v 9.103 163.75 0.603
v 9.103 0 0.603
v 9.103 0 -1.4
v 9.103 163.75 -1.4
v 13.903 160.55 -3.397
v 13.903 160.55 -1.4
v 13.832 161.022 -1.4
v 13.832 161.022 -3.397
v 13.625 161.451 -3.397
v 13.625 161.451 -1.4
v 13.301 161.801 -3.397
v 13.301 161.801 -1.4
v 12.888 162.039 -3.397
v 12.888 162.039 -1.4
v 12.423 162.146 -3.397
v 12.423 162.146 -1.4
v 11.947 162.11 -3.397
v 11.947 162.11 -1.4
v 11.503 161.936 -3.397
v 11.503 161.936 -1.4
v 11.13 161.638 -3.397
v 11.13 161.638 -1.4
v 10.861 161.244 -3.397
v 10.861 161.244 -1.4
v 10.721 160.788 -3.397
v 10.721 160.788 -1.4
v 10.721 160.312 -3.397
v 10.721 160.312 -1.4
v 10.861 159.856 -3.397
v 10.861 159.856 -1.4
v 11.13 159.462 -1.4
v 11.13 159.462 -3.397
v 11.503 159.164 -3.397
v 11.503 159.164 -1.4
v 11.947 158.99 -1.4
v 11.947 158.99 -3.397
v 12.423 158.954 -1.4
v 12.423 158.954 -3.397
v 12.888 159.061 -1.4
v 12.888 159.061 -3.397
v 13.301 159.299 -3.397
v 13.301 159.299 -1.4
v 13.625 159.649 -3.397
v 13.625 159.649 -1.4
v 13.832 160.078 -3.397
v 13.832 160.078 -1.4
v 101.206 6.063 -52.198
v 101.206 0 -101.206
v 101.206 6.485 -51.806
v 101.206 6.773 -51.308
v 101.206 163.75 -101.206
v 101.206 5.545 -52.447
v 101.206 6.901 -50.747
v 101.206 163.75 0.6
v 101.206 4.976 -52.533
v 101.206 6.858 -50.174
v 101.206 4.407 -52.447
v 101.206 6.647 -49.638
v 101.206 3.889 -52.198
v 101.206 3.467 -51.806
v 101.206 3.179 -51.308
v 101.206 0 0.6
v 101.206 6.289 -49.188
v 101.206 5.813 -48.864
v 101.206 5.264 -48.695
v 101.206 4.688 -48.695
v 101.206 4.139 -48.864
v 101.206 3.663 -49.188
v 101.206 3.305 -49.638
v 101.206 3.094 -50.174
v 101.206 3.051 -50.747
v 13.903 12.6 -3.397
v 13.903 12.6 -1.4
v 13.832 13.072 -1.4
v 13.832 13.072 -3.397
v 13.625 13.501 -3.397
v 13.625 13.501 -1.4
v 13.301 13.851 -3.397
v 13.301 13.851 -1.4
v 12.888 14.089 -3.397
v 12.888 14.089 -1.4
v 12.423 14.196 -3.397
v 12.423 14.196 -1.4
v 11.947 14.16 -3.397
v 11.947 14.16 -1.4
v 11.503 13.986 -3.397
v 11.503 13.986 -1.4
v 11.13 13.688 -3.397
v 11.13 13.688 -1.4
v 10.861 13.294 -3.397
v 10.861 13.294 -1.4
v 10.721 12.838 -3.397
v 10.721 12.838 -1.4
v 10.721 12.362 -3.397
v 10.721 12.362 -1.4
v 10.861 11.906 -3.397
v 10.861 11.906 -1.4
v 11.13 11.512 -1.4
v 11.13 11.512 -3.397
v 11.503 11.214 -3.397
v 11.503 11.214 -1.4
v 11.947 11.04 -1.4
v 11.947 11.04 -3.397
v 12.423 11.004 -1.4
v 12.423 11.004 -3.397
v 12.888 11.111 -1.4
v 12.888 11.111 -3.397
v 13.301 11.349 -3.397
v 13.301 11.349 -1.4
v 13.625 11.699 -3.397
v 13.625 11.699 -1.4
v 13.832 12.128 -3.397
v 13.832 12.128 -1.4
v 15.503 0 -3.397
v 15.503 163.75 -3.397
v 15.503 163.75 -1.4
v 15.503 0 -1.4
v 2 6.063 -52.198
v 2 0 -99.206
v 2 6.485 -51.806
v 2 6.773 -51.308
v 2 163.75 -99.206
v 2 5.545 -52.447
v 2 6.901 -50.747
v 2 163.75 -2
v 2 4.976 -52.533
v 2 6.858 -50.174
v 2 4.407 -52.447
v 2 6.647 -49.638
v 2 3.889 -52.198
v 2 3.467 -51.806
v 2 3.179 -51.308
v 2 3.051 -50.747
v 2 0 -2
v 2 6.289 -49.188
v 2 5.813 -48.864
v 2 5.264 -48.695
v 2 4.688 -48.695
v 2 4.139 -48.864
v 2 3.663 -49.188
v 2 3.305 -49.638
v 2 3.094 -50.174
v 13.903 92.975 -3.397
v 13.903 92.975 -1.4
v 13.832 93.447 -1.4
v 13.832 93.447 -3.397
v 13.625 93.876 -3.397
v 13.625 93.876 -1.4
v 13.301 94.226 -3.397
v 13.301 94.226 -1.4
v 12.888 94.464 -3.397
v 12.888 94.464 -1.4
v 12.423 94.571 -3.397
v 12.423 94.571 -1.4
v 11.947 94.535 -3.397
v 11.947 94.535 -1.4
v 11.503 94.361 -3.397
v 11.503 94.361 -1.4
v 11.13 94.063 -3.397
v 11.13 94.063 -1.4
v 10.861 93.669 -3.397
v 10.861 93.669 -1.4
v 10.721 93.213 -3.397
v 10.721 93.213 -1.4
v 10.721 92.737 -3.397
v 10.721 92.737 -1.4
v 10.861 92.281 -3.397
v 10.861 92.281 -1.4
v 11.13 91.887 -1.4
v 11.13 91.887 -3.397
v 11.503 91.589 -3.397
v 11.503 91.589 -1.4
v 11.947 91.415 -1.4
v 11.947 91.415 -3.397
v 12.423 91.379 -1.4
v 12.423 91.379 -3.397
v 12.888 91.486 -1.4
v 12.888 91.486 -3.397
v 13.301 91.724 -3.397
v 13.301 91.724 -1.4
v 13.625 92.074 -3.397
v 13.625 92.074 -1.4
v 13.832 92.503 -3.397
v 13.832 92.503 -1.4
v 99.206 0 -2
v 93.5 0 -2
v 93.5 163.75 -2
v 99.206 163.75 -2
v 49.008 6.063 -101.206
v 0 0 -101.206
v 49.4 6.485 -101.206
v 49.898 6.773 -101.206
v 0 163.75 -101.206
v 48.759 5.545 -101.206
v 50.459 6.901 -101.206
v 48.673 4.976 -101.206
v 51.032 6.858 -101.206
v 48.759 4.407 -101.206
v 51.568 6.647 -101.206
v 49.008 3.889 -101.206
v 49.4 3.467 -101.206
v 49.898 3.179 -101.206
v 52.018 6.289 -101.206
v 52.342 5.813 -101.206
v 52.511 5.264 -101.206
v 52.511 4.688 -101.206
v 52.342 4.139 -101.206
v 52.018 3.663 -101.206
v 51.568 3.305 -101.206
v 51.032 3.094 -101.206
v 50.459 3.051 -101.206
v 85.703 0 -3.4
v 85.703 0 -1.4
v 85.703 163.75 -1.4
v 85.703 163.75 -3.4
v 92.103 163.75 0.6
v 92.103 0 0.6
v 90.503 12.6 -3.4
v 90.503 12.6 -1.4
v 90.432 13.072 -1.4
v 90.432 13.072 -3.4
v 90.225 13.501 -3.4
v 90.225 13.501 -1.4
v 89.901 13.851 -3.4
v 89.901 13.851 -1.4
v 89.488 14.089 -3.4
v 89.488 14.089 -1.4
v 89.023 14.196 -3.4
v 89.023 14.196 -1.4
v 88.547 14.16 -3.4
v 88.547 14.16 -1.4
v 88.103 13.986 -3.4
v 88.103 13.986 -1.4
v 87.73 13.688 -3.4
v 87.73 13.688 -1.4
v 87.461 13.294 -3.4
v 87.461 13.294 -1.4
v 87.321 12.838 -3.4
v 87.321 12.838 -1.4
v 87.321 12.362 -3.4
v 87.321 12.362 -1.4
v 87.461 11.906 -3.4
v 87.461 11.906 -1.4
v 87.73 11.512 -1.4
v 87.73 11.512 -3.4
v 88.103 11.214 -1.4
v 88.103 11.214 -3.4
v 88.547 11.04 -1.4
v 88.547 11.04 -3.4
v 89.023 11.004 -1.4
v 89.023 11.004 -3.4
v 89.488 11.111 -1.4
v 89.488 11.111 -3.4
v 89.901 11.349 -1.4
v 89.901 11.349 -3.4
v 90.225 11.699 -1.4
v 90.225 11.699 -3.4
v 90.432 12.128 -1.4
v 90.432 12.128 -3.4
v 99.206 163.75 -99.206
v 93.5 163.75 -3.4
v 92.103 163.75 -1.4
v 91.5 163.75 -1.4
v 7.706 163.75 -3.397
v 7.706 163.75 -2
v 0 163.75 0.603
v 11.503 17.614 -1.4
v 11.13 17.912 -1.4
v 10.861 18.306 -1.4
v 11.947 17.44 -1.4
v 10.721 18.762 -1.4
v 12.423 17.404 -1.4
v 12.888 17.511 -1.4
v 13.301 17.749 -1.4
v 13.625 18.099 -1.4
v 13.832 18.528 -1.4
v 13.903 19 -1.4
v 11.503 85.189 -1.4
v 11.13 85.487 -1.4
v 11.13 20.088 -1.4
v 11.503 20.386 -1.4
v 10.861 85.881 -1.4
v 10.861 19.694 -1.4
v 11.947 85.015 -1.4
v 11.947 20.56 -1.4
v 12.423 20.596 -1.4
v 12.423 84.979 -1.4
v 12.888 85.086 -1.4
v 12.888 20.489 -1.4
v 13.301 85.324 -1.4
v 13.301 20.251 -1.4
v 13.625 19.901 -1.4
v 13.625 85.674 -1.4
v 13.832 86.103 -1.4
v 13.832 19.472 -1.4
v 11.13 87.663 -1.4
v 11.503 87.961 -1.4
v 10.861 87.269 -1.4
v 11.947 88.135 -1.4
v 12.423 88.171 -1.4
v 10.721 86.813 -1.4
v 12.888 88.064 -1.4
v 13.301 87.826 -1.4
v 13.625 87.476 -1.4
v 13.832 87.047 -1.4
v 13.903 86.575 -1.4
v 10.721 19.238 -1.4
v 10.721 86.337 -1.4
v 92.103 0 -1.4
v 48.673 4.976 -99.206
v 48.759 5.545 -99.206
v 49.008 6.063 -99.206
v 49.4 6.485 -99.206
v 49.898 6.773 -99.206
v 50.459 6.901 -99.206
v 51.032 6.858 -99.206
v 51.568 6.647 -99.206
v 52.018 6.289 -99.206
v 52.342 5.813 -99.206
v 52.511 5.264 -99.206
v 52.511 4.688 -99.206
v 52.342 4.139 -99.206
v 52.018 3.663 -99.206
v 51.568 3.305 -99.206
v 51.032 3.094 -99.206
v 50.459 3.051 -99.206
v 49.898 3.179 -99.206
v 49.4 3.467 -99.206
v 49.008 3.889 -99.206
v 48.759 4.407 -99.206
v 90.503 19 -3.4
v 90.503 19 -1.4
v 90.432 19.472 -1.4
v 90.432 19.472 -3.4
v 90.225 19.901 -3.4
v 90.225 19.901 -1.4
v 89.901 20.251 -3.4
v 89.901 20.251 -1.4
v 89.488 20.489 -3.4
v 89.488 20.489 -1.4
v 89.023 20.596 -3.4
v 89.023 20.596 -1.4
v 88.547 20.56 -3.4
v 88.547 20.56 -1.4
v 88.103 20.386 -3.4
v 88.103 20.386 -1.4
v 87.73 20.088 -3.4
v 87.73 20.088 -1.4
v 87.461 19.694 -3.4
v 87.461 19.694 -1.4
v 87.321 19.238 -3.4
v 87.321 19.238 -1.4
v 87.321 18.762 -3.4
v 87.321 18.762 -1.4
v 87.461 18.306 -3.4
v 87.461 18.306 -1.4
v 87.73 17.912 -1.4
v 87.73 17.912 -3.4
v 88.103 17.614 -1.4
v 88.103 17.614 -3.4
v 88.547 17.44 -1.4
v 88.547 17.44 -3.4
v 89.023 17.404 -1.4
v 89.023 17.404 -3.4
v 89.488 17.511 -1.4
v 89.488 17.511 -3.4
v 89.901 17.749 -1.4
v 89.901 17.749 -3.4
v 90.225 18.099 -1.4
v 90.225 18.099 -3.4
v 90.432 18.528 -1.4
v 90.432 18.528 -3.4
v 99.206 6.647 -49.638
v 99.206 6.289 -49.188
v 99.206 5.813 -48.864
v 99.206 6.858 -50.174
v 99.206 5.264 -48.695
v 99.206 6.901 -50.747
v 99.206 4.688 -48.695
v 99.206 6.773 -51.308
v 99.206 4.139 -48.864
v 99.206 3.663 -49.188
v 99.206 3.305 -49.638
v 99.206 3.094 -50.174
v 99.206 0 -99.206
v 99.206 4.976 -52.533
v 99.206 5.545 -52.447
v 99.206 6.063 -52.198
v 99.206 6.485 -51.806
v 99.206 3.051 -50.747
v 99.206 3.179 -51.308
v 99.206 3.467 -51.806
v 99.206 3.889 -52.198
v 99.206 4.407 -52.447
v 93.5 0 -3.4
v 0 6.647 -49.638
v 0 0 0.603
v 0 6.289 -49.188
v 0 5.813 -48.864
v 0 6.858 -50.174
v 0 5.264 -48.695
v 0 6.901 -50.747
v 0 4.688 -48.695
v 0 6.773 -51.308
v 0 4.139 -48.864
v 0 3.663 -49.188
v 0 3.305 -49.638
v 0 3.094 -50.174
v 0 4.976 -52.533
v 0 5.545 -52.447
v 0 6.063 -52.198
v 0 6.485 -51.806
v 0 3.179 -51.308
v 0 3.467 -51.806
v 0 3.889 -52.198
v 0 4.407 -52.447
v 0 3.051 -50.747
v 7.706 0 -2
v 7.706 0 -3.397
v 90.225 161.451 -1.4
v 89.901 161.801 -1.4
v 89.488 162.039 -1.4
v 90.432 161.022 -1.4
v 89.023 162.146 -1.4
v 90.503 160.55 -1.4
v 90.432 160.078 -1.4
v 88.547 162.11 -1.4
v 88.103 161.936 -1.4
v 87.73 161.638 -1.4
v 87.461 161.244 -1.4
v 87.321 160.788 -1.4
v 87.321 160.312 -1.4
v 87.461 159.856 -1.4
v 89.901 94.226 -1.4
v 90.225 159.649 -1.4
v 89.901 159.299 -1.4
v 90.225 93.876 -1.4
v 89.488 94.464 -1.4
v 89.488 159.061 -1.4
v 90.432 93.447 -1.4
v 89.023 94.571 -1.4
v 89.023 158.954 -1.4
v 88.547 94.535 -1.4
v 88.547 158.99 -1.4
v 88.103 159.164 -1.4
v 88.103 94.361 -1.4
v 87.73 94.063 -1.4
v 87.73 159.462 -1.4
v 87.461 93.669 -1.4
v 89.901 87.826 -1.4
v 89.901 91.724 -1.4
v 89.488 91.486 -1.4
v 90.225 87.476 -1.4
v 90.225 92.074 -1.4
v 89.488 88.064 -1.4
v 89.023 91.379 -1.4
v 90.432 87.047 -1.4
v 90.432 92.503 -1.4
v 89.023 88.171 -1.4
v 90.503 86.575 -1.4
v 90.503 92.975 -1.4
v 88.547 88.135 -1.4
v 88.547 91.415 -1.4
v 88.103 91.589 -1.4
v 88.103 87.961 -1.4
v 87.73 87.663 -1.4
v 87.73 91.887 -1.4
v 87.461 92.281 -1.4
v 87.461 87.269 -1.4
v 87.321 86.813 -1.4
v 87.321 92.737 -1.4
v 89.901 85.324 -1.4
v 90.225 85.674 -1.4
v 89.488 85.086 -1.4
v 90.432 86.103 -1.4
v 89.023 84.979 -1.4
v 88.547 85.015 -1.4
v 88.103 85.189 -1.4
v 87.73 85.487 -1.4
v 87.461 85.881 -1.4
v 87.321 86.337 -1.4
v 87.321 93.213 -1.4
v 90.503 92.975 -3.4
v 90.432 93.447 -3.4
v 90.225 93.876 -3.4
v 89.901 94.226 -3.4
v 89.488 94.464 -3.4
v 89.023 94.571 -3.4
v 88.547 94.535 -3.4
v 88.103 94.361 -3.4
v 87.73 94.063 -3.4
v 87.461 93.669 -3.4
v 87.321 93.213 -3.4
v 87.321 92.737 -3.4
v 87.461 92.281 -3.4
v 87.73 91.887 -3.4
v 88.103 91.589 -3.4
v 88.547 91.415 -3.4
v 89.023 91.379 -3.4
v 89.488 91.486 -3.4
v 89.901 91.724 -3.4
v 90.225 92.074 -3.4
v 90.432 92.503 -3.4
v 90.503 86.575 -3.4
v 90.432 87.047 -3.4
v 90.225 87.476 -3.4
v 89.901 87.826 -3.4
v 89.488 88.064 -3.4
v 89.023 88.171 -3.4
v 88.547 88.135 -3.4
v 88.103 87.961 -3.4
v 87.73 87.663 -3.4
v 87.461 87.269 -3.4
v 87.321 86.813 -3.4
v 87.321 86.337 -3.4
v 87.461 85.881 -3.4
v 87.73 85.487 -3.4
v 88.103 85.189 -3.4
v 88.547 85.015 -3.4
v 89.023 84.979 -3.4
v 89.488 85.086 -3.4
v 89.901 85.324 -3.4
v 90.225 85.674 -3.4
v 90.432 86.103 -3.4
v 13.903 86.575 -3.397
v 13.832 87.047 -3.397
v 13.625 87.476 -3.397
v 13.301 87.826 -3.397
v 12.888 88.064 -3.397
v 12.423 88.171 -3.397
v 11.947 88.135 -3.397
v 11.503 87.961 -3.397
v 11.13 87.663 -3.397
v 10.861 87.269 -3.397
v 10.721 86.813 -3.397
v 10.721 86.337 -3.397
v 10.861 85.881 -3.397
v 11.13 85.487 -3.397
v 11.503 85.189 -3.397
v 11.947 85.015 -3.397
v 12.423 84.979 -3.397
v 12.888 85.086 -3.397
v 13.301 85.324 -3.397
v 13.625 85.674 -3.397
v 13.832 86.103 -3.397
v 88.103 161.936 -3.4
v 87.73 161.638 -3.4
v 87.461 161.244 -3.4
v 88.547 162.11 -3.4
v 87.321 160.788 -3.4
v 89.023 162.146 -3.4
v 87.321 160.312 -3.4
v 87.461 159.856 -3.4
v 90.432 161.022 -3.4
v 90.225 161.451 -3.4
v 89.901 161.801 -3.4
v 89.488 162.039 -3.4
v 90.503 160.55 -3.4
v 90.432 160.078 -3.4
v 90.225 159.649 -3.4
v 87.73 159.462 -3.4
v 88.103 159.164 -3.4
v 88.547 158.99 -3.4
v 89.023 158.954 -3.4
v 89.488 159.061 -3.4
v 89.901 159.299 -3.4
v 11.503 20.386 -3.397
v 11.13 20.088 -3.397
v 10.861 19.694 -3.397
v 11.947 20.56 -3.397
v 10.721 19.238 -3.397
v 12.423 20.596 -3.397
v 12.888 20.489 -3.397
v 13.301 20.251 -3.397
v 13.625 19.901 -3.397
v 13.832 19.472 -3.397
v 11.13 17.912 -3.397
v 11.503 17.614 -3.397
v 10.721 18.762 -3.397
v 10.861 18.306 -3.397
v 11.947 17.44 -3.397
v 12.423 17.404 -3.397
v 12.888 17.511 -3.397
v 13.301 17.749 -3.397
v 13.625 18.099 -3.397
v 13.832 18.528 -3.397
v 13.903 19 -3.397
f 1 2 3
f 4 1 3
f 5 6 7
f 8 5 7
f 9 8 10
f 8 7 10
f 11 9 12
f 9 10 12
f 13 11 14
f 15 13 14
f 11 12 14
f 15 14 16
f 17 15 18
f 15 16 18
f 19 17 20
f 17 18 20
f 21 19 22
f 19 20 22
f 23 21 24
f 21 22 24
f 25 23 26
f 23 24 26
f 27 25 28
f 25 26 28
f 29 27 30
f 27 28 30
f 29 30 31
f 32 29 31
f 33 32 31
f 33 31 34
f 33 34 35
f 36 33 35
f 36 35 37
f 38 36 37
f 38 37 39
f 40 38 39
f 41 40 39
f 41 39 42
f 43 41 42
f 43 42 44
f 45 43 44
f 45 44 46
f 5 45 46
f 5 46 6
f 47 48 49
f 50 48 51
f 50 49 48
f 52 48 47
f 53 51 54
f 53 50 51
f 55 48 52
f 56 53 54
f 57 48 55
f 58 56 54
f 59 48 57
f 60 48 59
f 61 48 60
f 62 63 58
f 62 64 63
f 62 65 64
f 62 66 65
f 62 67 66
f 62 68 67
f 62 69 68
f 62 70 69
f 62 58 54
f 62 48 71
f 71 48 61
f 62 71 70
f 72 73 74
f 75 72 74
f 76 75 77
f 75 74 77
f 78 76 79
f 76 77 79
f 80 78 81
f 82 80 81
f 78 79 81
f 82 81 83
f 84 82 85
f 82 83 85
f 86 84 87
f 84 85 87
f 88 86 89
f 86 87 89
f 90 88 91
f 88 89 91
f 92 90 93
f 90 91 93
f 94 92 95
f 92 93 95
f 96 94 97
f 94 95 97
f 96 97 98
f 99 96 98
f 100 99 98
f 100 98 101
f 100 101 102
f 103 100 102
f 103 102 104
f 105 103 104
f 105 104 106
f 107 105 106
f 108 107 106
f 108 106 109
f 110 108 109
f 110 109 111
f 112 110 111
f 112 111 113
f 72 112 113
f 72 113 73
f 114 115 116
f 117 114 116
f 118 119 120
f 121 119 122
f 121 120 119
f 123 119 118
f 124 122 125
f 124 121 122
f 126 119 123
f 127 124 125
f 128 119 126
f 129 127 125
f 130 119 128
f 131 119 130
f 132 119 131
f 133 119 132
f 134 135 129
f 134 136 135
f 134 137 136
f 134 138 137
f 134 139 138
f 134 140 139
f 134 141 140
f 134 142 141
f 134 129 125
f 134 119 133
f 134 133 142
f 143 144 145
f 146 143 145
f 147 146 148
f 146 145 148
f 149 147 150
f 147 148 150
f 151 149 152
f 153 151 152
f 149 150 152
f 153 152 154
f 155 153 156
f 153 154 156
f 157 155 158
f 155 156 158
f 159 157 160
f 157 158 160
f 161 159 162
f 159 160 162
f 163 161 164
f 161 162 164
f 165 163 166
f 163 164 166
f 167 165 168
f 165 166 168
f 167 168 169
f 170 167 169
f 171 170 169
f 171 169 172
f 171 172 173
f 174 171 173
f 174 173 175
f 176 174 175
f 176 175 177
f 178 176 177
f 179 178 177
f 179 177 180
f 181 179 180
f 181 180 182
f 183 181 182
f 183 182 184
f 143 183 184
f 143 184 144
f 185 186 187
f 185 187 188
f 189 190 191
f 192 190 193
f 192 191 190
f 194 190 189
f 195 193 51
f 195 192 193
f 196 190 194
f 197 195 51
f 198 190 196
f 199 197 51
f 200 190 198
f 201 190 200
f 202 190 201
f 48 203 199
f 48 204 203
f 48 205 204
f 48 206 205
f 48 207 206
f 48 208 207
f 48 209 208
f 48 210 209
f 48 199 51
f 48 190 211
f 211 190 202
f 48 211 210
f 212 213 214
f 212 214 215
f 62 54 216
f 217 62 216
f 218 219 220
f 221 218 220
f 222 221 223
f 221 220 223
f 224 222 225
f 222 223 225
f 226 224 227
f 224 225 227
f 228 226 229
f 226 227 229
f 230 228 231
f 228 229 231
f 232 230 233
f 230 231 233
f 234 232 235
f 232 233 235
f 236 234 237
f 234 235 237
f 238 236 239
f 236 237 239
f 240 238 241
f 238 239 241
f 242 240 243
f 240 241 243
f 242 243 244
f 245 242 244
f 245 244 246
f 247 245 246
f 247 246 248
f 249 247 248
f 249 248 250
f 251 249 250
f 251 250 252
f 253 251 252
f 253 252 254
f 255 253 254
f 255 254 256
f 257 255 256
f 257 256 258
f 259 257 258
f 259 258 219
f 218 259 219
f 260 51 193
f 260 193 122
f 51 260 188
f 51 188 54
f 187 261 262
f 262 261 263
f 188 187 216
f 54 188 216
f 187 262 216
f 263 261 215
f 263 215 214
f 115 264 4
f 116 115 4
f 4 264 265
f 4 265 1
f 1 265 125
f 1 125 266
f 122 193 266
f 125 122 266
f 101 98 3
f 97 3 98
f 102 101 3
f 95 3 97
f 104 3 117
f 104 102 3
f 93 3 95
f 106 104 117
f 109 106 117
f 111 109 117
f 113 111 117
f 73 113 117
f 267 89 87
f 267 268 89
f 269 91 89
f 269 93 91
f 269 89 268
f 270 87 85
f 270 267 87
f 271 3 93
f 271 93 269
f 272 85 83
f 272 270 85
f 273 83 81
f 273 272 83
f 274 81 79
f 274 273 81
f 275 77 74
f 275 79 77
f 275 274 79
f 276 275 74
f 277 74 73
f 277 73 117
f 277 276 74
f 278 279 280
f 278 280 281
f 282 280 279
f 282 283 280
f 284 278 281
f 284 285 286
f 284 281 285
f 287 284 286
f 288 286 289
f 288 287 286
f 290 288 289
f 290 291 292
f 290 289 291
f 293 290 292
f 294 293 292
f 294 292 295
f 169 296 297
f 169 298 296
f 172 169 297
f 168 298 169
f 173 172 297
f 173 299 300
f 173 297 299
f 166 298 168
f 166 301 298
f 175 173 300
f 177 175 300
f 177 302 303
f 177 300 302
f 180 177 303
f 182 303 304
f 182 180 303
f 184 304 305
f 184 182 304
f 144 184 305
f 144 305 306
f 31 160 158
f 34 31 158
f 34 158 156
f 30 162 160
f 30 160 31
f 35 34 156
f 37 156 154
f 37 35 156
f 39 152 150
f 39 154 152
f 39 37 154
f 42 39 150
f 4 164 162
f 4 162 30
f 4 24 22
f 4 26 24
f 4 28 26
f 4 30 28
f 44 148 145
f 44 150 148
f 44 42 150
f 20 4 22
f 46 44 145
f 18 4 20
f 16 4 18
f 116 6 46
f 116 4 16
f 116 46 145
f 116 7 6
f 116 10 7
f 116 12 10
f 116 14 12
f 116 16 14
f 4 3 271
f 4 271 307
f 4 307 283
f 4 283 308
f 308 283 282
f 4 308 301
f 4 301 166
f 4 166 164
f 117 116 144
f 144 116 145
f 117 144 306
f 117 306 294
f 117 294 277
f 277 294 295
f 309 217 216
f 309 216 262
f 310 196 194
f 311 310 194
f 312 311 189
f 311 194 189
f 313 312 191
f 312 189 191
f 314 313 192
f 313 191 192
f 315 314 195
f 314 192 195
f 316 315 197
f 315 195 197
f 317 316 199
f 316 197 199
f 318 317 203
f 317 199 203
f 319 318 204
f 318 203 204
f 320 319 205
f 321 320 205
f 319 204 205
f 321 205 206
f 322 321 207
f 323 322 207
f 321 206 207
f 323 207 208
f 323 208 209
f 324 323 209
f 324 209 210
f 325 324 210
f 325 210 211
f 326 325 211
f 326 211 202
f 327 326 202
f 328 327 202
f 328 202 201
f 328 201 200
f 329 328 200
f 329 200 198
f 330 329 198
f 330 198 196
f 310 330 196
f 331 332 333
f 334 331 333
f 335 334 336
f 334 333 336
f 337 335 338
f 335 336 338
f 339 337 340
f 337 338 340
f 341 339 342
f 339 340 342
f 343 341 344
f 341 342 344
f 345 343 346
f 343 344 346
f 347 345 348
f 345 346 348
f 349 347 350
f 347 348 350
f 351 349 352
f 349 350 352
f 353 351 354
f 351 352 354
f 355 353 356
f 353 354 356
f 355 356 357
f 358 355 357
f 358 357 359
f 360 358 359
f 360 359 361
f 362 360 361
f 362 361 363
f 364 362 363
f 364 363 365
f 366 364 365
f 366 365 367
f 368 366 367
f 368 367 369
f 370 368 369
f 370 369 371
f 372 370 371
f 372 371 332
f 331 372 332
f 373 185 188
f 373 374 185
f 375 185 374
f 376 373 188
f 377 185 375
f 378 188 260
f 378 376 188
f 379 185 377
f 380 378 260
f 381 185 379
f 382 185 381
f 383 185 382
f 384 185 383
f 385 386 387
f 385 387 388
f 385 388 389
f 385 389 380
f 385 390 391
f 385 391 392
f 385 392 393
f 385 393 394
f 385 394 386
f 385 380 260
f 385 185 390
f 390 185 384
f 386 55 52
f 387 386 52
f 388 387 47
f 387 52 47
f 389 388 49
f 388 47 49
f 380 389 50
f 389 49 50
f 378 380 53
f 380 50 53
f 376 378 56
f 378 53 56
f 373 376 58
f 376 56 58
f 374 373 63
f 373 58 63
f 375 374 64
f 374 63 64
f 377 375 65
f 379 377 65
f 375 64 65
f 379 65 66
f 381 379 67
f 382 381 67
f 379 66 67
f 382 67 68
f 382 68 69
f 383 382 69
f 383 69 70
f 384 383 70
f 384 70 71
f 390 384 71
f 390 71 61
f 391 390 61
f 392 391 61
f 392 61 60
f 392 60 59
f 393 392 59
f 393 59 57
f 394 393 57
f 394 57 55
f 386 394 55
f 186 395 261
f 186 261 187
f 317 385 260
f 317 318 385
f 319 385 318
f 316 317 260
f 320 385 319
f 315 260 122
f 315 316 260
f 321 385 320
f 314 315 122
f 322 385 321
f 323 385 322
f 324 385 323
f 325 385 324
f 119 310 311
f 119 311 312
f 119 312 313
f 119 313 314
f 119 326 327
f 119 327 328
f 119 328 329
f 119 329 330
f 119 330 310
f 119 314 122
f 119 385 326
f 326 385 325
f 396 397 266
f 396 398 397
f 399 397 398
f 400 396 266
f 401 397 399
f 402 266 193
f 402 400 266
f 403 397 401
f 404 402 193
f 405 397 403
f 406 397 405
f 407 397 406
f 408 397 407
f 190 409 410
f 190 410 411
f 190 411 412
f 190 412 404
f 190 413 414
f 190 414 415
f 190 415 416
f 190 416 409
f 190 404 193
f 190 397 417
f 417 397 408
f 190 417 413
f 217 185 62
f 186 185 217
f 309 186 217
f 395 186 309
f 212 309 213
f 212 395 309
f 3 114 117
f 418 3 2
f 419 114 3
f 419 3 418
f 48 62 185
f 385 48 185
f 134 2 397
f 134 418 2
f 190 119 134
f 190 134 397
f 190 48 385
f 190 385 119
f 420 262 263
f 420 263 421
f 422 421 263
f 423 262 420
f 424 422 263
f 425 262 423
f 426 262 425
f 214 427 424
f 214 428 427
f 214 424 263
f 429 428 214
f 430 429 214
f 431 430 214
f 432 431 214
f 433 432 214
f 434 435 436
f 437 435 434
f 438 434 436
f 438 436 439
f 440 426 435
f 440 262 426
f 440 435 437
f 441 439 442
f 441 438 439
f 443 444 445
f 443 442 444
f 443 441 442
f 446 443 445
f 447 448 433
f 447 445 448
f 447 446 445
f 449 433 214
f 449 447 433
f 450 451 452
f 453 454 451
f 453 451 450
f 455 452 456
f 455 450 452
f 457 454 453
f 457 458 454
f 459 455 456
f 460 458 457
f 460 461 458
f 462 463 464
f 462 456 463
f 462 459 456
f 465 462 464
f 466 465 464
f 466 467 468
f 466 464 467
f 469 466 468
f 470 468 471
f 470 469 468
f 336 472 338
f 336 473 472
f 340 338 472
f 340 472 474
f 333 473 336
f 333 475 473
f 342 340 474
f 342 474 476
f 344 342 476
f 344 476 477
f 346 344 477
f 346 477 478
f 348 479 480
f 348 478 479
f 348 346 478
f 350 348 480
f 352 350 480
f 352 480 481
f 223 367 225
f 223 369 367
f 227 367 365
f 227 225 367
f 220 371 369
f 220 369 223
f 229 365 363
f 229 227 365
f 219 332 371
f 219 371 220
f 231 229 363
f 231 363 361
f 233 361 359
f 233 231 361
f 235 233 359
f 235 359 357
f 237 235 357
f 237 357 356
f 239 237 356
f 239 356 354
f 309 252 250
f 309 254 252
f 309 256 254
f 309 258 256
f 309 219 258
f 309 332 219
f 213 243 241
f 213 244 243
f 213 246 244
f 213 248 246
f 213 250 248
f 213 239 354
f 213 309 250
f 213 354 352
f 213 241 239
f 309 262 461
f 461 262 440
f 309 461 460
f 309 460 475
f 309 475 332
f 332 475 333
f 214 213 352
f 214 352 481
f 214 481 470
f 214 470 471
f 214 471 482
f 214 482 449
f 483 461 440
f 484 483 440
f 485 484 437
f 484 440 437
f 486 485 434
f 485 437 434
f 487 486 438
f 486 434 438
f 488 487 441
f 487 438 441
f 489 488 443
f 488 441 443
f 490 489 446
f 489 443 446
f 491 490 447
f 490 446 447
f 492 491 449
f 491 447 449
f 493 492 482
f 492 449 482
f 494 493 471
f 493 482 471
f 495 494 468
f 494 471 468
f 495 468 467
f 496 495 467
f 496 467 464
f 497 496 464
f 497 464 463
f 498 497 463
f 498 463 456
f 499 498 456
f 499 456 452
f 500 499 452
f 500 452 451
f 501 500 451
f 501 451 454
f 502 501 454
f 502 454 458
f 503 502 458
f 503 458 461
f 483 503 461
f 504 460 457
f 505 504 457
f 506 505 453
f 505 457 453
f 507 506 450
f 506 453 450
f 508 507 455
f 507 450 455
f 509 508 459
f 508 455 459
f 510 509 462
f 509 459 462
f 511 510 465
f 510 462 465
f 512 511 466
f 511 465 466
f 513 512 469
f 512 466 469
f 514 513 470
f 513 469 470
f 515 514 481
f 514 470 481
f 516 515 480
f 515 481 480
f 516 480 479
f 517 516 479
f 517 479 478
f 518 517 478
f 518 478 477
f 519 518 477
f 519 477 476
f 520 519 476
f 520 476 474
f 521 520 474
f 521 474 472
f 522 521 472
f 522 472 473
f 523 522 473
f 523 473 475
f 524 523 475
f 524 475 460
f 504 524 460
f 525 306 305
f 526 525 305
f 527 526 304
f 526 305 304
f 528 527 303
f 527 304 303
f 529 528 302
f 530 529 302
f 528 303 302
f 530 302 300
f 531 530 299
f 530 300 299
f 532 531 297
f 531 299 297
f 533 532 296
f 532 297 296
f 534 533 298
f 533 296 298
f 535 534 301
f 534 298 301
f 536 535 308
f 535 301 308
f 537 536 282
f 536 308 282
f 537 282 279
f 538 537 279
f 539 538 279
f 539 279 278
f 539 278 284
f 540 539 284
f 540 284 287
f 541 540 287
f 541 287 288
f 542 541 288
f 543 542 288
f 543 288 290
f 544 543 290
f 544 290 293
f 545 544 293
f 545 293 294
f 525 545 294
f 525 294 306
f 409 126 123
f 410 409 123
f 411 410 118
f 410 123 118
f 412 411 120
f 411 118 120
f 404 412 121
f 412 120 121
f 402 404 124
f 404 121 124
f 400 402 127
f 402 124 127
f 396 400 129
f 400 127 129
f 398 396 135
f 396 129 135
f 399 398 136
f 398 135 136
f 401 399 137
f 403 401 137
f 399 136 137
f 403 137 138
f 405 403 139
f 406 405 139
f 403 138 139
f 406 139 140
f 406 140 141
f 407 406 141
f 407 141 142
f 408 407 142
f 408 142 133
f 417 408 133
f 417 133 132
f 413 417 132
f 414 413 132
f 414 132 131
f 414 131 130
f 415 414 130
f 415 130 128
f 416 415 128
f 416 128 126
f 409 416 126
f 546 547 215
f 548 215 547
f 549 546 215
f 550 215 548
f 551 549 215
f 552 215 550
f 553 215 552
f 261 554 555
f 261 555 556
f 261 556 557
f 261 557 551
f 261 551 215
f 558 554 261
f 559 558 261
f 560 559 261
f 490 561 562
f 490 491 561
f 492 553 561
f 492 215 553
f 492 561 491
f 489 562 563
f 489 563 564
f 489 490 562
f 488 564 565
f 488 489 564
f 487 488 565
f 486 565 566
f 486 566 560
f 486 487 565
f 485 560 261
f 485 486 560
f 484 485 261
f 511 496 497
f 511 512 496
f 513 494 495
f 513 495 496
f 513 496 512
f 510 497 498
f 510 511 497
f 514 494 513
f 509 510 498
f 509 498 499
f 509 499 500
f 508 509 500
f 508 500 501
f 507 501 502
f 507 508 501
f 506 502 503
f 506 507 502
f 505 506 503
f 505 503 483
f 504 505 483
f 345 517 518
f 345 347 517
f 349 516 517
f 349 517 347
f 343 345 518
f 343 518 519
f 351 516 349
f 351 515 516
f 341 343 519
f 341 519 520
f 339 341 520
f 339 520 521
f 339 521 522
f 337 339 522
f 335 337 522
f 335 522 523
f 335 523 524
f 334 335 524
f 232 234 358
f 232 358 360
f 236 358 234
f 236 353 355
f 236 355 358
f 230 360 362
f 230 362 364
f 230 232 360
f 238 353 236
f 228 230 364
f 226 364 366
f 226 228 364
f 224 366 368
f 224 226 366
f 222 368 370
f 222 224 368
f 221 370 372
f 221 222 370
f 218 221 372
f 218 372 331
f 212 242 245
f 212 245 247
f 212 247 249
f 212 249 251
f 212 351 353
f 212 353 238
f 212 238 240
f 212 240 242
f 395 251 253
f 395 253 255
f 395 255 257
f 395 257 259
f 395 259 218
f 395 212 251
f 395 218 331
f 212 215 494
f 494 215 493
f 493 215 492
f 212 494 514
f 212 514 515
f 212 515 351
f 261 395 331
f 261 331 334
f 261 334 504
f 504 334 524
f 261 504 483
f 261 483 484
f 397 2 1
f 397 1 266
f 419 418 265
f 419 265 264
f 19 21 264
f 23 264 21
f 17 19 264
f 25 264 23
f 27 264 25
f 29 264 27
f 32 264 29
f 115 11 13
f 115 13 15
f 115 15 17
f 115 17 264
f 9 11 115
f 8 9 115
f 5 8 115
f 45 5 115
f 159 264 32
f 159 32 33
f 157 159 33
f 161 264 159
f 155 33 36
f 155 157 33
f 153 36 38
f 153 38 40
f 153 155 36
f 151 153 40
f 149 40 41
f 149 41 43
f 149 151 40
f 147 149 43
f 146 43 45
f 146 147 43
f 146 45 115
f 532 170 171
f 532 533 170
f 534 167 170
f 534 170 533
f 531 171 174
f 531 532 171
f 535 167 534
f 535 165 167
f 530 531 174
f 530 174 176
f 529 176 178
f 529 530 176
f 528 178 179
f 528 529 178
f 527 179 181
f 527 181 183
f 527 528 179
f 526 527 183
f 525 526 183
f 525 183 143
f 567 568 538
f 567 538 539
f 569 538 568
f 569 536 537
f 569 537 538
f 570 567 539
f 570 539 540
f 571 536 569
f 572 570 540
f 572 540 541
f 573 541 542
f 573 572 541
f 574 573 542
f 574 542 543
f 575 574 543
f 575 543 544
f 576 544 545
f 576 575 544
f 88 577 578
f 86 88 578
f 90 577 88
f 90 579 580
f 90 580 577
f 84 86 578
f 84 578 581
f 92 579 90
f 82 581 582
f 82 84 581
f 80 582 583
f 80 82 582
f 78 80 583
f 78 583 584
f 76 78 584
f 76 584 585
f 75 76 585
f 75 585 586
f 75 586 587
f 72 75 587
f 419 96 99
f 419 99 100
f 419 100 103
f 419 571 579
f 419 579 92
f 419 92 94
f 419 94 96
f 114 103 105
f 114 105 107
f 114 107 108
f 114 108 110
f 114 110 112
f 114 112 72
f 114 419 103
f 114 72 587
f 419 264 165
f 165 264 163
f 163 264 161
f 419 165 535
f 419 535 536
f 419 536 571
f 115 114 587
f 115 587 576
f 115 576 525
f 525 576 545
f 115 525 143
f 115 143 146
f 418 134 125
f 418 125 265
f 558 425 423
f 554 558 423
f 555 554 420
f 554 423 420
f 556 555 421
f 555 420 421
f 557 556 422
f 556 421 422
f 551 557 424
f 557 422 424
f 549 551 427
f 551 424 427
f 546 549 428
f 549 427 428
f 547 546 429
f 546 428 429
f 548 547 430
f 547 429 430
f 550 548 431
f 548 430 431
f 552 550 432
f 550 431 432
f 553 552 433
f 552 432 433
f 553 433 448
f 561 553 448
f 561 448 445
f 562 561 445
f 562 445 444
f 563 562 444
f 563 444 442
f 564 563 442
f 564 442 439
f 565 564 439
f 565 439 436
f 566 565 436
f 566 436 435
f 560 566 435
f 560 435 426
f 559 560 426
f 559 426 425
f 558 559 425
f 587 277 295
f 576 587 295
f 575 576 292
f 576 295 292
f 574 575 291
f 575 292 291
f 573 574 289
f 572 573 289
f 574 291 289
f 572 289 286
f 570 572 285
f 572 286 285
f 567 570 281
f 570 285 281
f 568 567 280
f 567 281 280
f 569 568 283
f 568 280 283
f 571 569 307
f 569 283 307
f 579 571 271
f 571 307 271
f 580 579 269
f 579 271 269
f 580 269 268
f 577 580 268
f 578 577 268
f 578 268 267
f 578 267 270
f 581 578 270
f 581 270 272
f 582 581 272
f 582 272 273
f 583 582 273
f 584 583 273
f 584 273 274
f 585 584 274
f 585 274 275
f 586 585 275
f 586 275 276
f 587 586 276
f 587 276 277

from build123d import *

# Parameters (mm, degrees)
BOSS_EXTRUDE1_DEPTH = 327.5
SKETCH2_R           = 1.6
CUT_EXTRUDE2_DEPTH  = 10
SKETCH3_R           = 1.93
CUT_EXTRUDE3_DEPTH  = 102
SKETCH4_R           = 1.93
CUT_EXTRUDE4_DEPTH  = 10
SKETCH5_W           = 116.752499477
SKETCH5_H           = 165.661363519
CUT_EXTRUDE5_DEPTH  = 191
SKETCH6_W           = 83
SKETCH6_H           = 2.003
CUT_EXTRUDE6_DEPTH  = 203


with BuildPart() as part:
    # Sketch1 → Boss-Extrude1 (new body)
    with BuildSketch(Plane(origin=(0, 0, 0), x_dir=(1, 0, 0), z_dir=(0, 1, 0))):
        Polygon((0, -0.603), (0, 101.206), (101.206, 101.206), (101.206, -0.6), (91.5, -0.6), (91.5, 1.4), (85.703, 1.4), (85.703, 3.4), (93.5, 3.4), (93.5, 2), (99.206, 2), (99.206, 99.206), (2, 99.206), (2, 2), (7.706, 2), (7.706, 3.397), (15.503, 3.397), (15.503, 1.397), (9.706, 1.397), (9.706, -0.603), align=None)
    extrude(amount=BOSS_EXTRUDE1_DEPTH)

    # Sketch2 → Cut-Extrude2 (cut)
    with BuildSketch(Plane.XY.offset(-1.397)):
        with Locations((12.303, 314.9)):
            Circle(SKETCH2_R)
        with Locations((12.303, 308.5)):
            Circle(SKETCH2_R)
        with Locations((88.903, 314.9)):
            Circle(SKETCH2_R)
        with Locations((88.903, 308.5)):
            Circle(SKETCH2_R)
        with Locations((12.303, 240.925)):
            Circle(SKETCH2_R)
        with Locations((12.303, 234.525)):
            Circle(SKETCH2_R)
        with Locations((88.903, 240.925)):
            Circle(SKETCH2_R)
        with Locations((88.903, 234.525)):
            Circle(SKETCH2_R)
        with Locations((12.303, 166.95)):
            Circle(SKETCH2_R)
        with Locations((12.303, 160.55)):
            Circle(SKETCH2_R)
        with Locations((88.903, 166.95)):
            Circle(SKETCH2_R)
        with Locations((88.903, 160.55)):
            Circle(SKETCH2_R)
        with Locations((12.303, 92.975)):
            Circle(SKETCH2_R)
        with Locations((12.303, 86.575)):
            Circle(SKETCH2_R)
        with Locations((88.903, 92.975)):
            Circle(SKETCH2_R)
        with Locations((88.903, 86.575)):
            Circle(SKETCH2_R)
        with Locations((12.303, 19)):
            Circle(SKETCH2_R)
        with Locations((12.303, 12.6)):
            Circle(SKETCH2_R)
        with Locations((88.903, 19)):
            Circle(SKETCH2_R)
        with Locations((88.903, 12.6)):
            Circle(SKETCH2_R)
    extrude(amount=-CUT_EXTRUDE2_DEPTH, mode=Mode.SUBTRACT)

    # Sketch3 → Cut-Extrude3 (cut)
    with BuildSketch(Plane(origin=(101.206, 0, 0), x_dir=(0, 0, -1), z_dir=(1, 0, 0))):
        with Locations((50.603, 322.524)):
            Circle(SKETCH3_R)
        with Locations((50.603, 4.976)):
            Circle(SKETCH3_R)
    extrude(amount=-CUT_EXTRUDE3_DEPTH, mode=Mode.SUBTRACT)

    # Sketch4 → Cut-Extrude4 (cut)
    with BuildSketch(Plane(origin=(0, 0, -101.206), x_dir=(-1, 0, 0), z_dir=(0, 0, -1))):
        with Locations((-50.603, 322.524)):
            Circle(SKETCH4_R)
        with Locations((-50.603, 4.976)):
            Circle(SKETCH4_R)
    extrude(amount=-CUT_EXTRUDE4_DEPTH, mode=Mode.SUBTRACT)

    # Sketch5 → Cut-Extrude5 (cut)
    with BuildSketch(Plane.ZY):
        with Locations((-42.829750262, 246.58068176)):
            Rectangle(SKETCH5_W, SKETCH5_H)
    extrude(amount=-CUT_EXTRUDE5_DEPTH, mode=Mode.SUBTRACT)

    # Sketch6 → Cut-Extrude6 (cut)
    with BuildSketch(Plane(origin=(0, 163.75, 0), x_dir=(1, 0, 0), z_dir=(0, 1, 0))):
        with Locations((50.603, 0.3985)):
            Rectangle(SKETCH6_W, SKETCH6_H)
    extrude(amount=-CUT_EXTRUDE6_DEPTH, mode=Mode.SUBTRACT)


solid = part.part
